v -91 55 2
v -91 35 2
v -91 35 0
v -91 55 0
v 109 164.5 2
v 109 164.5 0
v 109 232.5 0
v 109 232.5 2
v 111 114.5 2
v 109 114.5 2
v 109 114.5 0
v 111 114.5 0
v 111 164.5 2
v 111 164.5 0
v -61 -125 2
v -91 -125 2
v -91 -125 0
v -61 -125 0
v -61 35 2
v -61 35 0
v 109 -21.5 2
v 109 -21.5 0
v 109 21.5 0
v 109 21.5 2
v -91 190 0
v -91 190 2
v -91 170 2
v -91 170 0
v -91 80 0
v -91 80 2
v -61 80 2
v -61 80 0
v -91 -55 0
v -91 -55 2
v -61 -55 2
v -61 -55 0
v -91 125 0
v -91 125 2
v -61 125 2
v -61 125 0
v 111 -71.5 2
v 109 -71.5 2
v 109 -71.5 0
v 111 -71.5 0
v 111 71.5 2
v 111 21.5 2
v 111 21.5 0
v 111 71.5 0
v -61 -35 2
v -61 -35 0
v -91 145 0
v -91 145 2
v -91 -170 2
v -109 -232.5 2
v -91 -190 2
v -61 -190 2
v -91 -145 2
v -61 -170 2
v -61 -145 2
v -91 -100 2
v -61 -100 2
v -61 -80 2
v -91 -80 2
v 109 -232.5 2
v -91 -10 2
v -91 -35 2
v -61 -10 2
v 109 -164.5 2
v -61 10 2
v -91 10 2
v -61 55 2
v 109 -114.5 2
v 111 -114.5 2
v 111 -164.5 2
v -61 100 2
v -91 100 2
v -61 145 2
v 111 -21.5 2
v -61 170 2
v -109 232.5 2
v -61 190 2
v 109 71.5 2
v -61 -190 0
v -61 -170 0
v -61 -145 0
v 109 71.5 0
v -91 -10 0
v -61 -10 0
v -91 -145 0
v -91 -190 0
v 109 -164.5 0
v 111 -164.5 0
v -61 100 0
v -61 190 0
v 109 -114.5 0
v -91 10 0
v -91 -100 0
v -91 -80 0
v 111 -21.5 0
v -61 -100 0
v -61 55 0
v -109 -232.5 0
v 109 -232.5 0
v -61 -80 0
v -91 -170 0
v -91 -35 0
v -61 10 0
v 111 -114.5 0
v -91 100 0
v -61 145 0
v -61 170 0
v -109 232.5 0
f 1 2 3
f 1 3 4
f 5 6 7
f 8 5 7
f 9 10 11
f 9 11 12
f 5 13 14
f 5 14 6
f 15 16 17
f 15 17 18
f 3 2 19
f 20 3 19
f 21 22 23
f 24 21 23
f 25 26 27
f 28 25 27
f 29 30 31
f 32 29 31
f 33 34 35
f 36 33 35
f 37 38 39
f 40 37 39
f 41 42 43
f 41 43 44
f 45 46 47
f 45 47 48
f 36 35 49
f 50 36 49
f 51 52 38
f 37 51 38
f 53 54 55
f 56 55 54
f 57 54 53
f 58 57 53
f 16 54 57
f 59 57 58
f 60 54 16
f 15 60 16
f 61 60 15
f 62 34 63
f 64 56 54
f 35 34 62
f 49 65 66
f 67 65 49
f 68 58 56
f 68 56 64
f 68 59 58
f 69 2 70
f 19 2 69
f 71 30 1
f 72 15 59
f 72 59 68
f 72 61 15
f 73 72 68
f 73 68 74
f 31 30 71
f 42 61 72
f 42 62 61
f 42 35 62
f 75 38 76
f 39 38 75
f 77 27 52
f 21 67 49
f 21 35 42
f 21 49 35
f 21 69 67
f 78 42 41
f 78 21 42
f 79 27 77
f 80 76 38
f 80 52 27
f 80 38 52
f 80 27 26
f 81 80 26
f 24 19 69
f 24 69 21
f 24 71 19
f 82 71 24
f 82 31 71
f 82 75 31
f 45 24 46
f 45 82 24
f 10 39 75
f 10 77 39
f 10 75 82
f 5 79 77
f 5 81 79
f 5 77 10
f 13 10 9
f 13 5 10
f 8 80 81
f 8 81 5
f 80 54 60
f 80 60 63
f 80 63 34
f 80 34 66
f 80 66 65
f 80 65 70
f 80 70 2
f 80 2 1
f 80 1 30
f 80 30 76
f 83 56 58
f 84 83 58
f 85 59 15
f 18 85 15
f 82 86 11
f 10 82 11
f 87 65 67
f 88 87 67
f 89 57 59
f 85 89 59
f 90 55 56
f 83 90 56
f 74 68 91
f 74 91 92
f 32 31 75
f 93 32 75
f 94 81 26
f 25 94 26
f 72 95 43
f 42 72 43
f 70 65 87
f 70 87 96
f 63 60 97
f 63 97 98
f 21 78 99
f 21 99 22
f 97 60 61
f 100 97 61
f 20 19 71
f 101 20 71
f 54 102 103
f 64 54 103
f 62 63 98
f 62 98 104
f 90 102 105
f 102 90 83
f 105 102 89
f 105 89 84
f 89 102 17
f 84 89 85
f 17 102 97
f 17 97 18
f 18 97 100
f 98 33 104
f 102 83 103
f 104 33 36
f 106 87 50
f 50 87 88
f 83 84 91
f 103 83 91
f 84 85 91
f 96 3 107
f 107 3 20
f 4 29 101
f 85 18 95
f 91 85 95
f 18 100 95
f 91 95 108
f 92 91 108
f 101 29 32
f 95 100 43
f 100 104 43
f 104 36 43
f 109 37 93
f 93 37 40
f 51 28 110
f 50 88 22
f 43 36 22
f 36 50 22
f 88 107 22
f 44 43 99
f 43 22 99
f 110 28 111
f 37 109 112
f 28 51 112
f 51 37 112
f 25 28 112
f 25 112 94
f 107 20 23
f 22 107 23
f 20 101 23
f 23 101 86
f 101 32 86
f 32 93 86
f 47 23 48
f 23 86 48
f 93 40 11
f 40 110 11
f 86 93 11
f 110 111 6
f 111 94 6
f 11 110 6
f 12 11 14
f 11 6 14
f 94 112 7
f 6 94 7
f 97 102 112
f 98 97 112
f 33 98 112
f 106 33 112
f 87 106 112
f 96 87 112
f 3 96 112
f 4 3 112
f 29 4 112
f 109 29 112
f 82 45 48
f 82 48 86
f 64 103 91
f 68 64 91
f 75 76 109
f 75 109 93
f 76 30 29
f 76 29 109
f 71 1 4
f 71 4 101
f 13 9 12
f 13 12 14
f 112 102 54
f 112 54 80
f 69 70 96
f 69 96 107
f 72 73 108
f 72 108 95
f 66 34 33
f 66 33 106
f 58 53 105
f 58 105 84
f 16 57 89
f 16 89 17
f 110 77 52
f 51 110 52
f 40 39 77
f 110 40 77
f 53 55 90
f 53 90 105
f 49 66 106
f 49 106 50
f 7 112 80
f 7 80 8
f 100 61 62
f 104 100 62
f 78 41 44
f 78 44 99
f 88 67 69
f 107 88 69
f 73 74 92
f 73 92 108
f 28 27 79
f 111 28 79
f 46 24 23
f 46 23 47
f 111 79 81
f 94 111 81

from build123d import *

# Parameters (mm, degrees)
SKETCH1_W           = 218
SKETCH1_H           = 465
BOSS_EXTRUDE1_DEPTH = 2
SKETCH2_W           = 30
SKETCH2_H           = 20
CUT_EXTRUDE1_DEPTH  = 8
BOSS_EXTRUDE2_DEPTH = 2


with BuildPart() as part:
    # Sketch1 → Boss-Extrude1 (new body)
    with BuildSketch(Plane.XY):
        Rectangle(SKETCH1_W, SKETCH1_H)
    extrude(amount=BOSS_EXTRUDE1_DEPTH)

    # Sketch2 → Cut-Extrude1 (cut)
    with BuildSketch(Plane.XY.offset(2)):
        Polygon((-61, 190), (-91, 190), (-91, 180), (-91, 170), (-61, 170), align=None)
        Polygon((-61, 145), (-91, 145), (-91, 135), (-91, 125), (-61, 125), align=None)
        with Locations((-76, 90)):
            Rectangle(SKETCH2_W, SKETCH2_H)
        with Locations((-76, 45)):
            Rectangle(SKETCH2_W, SKETCH2_H)
        with Locations((-76, 0)):
            Rectangle(SKETCH2_W, SKETCH2_H)
        with Locations((-76, -45)):
            Rectangle(SKETCH2_W, SKETCH2_H)
        with Locations((-76, -90)):
            Rectangle(SKETCH2_W, SKETCH2_H)
        with Locations((-76, -135)):
            Rectangle(SKETCH2_W, SKETCH2_H)
        with Locations((-76, -180)):
            Rectangle(SKETCH2_W, SKETCH2_H)
    extrude(amount=-CUT_EXTRUDE1_DEPTH, mode=Mode.SUBTRACT)

    # Sketch3 → Boss-Extrude2 (add)
    with BuildSketch(Plane.XY.offset(2)):
        Polygon((111, 164.5), (109, 164.5), (109, 139.5), (109, 114.5), (111, 114.5), align=None)
        Polygon((111, 71.5), (109, 71.5), (109, 46.5), (109, 21.5), (111, 21.5), align=None)
        Polygon((111, -114.5), (109, -114.5), (109, -139.5), (109, -164.5), (111, -164.5), align=None)
        Polygon((111, -21.5), (109, -21.5), (109, -46.5), (109, -71.5), (111, -71.5), align=None)
    extrude(amount=-BOSS_EXTRUDE2_DEPTH)


solid = part.part
